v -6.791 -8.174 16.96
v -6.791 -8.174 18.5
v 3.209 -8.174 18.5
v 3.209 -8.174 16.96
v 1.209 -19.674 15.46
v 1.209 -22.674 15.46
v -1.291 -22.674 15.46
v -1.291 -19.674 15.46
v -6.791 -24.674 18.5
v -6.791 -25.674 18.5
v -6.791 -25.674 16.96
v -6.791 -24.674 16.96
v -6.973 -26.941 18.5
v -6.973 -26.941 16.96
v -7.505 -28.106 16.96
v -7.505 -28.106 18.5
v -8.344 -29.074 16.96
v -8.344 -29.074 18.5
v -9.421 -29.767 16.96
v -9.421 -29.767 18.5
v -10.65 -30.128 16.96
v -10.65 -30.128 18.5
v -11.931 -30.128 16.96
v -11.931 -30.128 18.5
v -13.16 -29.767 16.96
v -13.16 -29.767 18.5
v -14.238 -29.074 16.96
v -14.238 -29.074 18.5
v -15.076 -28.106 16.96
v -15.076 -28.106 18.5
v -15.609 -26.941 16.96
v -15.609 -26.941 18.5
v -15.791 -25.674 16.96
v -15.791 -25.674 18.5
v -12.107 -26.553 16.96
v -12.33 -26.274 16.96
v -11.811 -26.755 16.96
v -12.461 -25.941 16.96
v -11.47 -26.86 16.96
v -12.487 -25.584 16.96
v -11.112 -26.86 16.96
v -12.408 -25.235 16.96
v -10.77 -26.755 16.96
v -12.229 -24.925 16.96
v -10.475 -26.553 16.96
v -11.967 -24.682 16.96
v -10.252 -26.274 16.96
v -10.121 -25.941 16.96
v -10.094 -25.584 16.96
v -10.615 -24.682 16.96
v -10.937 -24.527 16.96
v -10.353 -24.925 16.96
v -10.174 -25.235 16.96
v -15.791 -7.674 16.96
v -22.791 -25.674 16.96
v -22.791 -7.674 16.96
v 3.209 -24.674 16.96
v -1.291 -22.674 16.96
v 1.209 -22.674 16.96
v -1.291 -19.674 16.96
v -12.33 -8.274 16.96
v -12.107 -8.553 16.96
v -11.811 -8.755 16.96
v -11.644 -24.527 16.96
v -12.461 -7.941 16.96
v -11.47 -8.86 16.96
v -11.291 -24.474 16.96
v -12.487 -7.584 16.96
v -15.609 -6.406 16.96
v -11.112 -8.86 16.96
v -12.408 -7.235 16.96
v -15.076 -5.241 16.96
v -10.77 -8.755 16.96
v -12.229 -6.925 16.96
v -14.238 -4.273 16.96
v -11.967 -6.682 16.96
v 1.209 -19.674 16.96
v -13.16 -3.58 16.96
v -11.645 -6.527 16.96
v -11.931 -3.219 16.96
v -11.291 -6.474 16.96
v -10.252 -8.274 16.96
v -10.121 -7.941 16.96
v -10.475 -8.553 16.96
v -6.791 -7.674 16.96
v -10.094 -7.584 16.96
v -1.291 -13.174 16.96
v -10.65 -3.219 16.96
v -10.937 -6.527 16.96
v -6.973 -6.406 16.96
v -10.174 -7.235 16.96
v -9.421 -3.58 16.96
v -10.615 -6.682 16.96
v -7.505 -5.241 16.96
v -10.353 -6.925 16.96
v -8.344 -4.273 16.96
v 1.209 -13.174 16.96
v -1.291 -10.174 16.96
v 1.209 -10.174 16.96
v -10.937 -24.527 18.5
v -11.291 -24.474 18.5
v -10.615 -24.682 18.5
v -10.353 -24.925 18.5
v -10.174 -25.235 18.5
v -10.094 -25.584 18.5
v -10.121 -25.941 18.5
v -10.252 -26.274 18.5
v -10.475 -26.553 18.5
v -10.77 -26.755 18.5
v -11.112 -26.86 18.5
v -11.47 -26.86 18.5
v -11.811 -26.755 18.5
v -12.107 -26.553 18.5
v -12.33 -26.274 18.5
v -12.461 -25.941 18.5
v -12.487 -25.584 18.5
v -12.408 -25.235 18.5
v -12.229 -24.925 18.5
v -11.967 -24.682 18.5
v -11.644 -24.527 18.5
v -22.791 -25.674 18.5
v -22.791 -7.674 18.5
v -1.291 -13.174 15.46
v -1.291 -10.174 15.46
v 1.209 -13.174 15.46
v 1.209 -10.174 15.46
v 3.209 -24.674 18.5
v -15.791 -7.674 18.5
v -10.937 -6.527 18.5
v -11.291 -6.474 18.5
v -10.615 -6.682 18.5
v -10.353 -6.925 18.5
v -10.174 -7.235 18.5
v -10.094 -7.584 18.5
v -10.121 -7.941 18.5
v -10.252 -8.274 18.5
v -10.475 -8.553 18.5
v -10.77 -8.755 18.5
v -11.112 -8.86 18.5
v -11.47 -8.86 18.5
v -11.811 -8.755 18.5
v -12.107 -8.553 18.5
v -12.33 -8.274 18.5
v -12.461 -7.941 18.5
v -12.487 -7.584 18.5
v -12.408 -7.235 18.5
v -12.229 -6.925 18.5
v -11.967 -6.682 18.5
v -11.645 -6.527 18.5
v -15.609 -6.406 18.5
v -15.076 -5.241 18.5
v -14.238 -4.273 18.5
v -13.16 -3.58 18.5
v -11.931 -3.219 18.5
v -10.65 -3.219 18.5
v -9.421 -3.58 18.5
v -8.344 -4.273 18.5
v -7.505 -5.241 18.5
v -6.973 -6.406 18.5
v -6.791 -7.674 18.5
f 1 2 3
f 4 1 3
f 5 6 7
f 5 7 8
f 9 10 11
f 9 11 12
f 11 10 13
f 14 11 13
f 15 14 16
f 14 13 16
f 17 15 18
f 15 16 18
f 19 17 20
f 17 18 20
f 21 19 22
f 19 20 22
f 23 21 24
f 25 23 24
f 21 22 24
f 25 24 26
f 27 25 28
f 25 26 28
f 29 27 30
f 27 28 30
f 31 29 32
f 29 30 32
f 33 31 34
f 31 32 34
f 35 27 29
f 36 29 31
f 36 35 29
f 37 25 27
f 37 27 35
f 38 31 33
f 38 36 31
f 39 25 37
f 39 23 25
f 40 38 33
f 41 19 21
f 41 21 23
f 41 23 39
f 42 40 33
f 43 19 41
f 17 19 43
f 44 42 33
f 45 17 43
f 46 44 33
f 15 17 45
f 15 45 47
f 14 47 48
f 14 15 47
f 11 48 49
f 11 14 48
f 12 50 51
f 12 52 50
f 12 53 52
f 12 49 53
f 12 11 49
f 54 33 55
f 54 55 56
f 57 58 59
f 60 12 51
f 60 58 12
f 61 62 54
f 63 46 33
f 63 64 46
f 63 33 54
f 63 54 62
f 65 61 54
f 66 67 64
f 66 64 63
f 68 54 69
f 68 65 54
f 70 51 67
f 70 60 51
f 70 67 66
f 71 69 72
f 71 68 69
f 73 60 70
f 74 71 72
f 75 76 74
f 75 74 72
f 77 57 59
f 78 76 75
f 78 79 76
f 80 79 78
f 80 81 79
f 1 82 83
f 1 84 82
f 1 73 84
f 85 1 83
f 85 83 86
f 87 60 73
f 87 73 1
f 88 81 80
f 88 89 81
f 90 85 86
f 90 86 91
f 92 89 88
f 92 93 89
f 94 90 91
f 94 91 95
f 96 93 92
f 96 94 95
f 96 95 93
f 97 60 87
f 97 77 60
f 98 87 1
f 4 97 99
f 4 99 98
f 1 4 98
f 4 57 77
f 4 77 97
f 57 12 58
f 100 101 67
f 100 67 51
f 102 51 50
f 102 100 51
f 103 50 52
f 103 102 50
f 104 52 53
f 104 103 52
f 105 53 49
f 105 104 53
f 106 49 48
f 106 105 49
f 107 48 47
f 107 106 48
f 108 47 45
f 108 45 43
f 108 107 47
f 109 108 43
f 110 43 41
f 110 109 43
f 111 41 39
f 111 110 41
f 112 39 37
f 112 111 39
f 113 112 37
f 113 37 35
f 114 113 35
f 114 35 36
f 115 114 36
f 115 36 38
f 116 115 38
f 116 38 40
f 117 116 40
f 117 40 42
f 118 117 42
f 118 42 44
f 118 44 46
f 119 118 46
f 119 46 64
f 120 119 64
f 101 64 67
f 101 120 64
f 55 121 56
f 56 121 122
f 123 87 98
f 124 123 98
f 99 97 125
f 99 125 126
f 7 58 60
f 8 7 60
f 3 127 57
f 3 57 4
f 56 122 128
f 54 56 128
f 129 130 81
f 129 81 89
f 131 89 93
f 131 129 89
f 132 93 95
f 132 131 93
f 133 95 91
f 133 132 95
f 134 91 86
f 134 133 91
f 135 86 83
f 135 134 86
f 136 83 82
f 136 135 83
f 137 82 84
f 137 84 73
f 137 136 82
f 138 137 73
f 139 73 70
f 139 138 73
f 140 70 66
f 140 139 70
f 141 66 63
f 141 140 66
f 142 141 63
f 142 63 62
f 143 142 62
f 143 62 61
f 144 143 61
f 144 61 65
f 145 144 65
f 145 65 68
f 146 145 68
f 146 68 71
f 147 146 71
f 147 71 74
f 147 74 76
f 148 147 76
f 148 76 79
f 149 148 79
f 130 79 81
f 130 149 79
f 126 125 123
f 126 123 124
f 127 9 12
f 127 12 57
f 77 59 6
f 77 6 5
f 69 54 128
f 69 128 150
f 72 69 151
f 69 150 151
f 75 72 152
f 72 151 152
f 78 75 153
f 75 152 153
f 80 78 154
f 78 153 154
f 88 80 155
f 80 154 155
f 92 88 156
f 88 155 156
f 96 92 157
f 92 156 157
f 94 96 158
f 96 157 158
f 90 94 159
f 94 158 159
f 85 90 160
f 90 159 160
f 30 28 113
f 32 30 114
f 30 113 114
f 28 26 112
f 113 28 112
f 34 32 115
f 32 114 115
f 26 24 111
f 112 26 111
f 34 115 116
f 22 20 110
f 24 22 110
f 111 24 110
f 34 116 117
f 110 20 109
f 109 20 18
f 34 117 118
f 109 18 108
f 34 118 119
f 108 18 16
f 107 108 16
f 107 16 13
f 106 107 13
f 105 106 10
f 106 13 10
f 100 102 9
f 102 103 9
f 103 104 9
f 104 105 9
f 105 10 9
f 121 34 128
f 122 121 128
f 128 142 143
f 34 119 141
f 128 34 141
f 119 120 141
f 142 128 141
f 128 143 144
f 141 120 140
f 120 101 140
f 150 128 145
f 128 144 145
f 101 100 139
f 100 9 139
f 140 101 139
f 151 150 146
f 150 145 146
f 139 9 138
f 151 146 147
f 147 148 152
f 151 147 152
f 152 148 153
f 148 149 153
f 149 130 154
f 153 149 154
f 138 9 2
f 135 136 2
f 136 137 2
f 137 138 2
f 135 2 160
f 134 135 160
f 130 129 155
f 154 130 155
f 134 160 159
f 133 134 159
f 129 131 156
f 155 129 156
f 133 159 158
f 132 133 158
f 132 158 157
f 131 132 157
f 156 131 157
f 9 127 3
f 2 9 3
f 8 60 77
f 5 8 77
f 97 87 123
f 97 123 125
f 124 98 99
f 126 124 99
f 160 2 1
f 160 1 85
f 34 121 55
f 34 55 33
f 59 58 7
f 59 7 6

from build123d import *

# Parameters (mm, degrees)
BOX015_W                  = 3
BOX015_H                  = 2.5
BOX015_DEPTH              = 1.5
BOX014_W                  = 3
BOX014_H                  = 2.5
BOX014_DEPTH              = 1.5
CYLINDER009_R             = 1.2
CYLINDER009_DEPTH         = 1.54
CYLINDER010_R             = 1.2
CYLINDER010_DEPTH         = 1.54
CYLINDER011_R             = 4.5
CYLINDER011_DEPTH         = 1.54
CYLINDER012_R             = 4.5
CYLINDER012_DEPTH         = 1.54
BOX013_W                  = 18
BOX013_H                  = 16
BOX013_DEPTH              = 1.54
BOX016_W                  = 16.5
BOX016_H                  = 10
BOX016_DEPTH              = 1.54
FUSION014_ROLL_ANGLE      = 180
FUSION014_PLACEMENT_ANGLE = 90.000069


with BuildPart() as cubo015:
    # Box015 → Box015 (new body)
    with BuildSketch(Plane(origin=(12.5, 21.5, 1.54), x_dir=(1, 0, 0), z_dir=(0, 0, 1))):
        with Locations((1.5, 1.25)):
            Rectangle(BOX015_W, BOX015_H)
    extrude(amount=BOX015_DEPTH)


with BuildPart() as cubo014:
    # Box014 → Box014 (new body)
    with BuildSketch(Plane(origin=(3, 21.5, 1.54), x_dir=(1, 0, 0), z_dir=(0, 0, 1))):
        with Locations((1.5, 1.25)):
            Rectangle(BOX014_W, BOX014_H)
    extrude(amount=BOX014_DEPTH)


with BuildPart() as cilindro008:
    # Cylinder009 → Cylinder009 (new body)
    with BuildSketch(Plane(origin=(0, 11.5, 0), x_dir=(1, 0, 0), z_dir=(0, 0, 1))):
        Circle(CYLINDER009_R)
    extrude(amount=CYLINDER009_DEPTH)


with BuildPart() as cilindro009:
    # Cylinder010 → Cylinder010 (new body)
    with BuildSketch(Plane(origin=(18, 11.5, 0), x_dir=(1, 0, 0), z_dir=(0, 0, 1))):
        Circle(CYLINDER010_R)
    extrude(amount=CYLINDER010_DEPTH)


with BuildPart() as cilindro010:
    # Cylinder011 → Cylinder011 (new body)
    with BuildSketch(Plane(origin=(0, 11.5, 0), x_dir=(1, 0, 0), z_dir=(0, 0, 1))):
        Circle(CYLINDER011_R)
    extrude(amount=CYLINDER011_DEPTH)


with BuildPart() as cilindro011:
    # Cylinder012 → Cylinder012 (new body)
    with BuildSketch(Plane(origin=(18, 11.5, 0), x_dir=(1, 0, 0), z_dir=(0, 0, 1))):
        Circle(CYLINDER012_R)
    extrude(amount=CYLINDER012_DEPTH)


with BuildPart() as cubo013:
    # Box013 → Box013 (new body)
    with BuildSketch(Plane.XY):
        with Locations((9, 8)):
            Rectangle(BOX013_W, BOX013_H)
    extrude(amount=BOX013_DEPTH)


with BuildPart() as sensormodel:
    # Box016 → Box016 (new body)
    with BuildSketch(Plane(origin=(1, 16, 0), x_dir=(1, 0, 0), z_dir=(0, 0, 1))):
        with Locations((8.25, 5)):
            Rectangle(BOX016_W, BOX016_H)
    extrude(amount=BOX016_DEPTH)

    # Fusion011: union Cubo013
    add(cubo013.part)

    # Fusion012: union Cilindro011
    add(cilindro011.part)

    # Fusion013: union Cilindro010
    add(cilindro010.part)

    # Cut013: cut Cilindro009
    add(cilindro009.part, mode=Mode.SUBTRACT)

    # Cut014: cut Cilindro008
    add(cilindro008.part, mode=Mode.SUBTRACT)

    # Fusion014: union Cubo015, Cubo014
    add(cubo015.part)
    add(cubo014.part)


with BuildPart() as sensormodel_1:
    # Fusion014 roll: moved
    add(sensormodel.part.rotate(Axis((0, 0, 0), (1, 0, 0)), FUSION014_ROLL_ANGLE))


with BuildPart() as sensormodel_2:
    # Fusion014 placement: moved
    add(sensormodel_1.part.moved(Location((-22.790785, -25.673595, 18.5))).rotate(Axis((-22.790785, -25.673595, 18.5), (0, 0, 1)), FUSION014_PLACEMENT_ANGLE))


solid = sensormodel_2.part
